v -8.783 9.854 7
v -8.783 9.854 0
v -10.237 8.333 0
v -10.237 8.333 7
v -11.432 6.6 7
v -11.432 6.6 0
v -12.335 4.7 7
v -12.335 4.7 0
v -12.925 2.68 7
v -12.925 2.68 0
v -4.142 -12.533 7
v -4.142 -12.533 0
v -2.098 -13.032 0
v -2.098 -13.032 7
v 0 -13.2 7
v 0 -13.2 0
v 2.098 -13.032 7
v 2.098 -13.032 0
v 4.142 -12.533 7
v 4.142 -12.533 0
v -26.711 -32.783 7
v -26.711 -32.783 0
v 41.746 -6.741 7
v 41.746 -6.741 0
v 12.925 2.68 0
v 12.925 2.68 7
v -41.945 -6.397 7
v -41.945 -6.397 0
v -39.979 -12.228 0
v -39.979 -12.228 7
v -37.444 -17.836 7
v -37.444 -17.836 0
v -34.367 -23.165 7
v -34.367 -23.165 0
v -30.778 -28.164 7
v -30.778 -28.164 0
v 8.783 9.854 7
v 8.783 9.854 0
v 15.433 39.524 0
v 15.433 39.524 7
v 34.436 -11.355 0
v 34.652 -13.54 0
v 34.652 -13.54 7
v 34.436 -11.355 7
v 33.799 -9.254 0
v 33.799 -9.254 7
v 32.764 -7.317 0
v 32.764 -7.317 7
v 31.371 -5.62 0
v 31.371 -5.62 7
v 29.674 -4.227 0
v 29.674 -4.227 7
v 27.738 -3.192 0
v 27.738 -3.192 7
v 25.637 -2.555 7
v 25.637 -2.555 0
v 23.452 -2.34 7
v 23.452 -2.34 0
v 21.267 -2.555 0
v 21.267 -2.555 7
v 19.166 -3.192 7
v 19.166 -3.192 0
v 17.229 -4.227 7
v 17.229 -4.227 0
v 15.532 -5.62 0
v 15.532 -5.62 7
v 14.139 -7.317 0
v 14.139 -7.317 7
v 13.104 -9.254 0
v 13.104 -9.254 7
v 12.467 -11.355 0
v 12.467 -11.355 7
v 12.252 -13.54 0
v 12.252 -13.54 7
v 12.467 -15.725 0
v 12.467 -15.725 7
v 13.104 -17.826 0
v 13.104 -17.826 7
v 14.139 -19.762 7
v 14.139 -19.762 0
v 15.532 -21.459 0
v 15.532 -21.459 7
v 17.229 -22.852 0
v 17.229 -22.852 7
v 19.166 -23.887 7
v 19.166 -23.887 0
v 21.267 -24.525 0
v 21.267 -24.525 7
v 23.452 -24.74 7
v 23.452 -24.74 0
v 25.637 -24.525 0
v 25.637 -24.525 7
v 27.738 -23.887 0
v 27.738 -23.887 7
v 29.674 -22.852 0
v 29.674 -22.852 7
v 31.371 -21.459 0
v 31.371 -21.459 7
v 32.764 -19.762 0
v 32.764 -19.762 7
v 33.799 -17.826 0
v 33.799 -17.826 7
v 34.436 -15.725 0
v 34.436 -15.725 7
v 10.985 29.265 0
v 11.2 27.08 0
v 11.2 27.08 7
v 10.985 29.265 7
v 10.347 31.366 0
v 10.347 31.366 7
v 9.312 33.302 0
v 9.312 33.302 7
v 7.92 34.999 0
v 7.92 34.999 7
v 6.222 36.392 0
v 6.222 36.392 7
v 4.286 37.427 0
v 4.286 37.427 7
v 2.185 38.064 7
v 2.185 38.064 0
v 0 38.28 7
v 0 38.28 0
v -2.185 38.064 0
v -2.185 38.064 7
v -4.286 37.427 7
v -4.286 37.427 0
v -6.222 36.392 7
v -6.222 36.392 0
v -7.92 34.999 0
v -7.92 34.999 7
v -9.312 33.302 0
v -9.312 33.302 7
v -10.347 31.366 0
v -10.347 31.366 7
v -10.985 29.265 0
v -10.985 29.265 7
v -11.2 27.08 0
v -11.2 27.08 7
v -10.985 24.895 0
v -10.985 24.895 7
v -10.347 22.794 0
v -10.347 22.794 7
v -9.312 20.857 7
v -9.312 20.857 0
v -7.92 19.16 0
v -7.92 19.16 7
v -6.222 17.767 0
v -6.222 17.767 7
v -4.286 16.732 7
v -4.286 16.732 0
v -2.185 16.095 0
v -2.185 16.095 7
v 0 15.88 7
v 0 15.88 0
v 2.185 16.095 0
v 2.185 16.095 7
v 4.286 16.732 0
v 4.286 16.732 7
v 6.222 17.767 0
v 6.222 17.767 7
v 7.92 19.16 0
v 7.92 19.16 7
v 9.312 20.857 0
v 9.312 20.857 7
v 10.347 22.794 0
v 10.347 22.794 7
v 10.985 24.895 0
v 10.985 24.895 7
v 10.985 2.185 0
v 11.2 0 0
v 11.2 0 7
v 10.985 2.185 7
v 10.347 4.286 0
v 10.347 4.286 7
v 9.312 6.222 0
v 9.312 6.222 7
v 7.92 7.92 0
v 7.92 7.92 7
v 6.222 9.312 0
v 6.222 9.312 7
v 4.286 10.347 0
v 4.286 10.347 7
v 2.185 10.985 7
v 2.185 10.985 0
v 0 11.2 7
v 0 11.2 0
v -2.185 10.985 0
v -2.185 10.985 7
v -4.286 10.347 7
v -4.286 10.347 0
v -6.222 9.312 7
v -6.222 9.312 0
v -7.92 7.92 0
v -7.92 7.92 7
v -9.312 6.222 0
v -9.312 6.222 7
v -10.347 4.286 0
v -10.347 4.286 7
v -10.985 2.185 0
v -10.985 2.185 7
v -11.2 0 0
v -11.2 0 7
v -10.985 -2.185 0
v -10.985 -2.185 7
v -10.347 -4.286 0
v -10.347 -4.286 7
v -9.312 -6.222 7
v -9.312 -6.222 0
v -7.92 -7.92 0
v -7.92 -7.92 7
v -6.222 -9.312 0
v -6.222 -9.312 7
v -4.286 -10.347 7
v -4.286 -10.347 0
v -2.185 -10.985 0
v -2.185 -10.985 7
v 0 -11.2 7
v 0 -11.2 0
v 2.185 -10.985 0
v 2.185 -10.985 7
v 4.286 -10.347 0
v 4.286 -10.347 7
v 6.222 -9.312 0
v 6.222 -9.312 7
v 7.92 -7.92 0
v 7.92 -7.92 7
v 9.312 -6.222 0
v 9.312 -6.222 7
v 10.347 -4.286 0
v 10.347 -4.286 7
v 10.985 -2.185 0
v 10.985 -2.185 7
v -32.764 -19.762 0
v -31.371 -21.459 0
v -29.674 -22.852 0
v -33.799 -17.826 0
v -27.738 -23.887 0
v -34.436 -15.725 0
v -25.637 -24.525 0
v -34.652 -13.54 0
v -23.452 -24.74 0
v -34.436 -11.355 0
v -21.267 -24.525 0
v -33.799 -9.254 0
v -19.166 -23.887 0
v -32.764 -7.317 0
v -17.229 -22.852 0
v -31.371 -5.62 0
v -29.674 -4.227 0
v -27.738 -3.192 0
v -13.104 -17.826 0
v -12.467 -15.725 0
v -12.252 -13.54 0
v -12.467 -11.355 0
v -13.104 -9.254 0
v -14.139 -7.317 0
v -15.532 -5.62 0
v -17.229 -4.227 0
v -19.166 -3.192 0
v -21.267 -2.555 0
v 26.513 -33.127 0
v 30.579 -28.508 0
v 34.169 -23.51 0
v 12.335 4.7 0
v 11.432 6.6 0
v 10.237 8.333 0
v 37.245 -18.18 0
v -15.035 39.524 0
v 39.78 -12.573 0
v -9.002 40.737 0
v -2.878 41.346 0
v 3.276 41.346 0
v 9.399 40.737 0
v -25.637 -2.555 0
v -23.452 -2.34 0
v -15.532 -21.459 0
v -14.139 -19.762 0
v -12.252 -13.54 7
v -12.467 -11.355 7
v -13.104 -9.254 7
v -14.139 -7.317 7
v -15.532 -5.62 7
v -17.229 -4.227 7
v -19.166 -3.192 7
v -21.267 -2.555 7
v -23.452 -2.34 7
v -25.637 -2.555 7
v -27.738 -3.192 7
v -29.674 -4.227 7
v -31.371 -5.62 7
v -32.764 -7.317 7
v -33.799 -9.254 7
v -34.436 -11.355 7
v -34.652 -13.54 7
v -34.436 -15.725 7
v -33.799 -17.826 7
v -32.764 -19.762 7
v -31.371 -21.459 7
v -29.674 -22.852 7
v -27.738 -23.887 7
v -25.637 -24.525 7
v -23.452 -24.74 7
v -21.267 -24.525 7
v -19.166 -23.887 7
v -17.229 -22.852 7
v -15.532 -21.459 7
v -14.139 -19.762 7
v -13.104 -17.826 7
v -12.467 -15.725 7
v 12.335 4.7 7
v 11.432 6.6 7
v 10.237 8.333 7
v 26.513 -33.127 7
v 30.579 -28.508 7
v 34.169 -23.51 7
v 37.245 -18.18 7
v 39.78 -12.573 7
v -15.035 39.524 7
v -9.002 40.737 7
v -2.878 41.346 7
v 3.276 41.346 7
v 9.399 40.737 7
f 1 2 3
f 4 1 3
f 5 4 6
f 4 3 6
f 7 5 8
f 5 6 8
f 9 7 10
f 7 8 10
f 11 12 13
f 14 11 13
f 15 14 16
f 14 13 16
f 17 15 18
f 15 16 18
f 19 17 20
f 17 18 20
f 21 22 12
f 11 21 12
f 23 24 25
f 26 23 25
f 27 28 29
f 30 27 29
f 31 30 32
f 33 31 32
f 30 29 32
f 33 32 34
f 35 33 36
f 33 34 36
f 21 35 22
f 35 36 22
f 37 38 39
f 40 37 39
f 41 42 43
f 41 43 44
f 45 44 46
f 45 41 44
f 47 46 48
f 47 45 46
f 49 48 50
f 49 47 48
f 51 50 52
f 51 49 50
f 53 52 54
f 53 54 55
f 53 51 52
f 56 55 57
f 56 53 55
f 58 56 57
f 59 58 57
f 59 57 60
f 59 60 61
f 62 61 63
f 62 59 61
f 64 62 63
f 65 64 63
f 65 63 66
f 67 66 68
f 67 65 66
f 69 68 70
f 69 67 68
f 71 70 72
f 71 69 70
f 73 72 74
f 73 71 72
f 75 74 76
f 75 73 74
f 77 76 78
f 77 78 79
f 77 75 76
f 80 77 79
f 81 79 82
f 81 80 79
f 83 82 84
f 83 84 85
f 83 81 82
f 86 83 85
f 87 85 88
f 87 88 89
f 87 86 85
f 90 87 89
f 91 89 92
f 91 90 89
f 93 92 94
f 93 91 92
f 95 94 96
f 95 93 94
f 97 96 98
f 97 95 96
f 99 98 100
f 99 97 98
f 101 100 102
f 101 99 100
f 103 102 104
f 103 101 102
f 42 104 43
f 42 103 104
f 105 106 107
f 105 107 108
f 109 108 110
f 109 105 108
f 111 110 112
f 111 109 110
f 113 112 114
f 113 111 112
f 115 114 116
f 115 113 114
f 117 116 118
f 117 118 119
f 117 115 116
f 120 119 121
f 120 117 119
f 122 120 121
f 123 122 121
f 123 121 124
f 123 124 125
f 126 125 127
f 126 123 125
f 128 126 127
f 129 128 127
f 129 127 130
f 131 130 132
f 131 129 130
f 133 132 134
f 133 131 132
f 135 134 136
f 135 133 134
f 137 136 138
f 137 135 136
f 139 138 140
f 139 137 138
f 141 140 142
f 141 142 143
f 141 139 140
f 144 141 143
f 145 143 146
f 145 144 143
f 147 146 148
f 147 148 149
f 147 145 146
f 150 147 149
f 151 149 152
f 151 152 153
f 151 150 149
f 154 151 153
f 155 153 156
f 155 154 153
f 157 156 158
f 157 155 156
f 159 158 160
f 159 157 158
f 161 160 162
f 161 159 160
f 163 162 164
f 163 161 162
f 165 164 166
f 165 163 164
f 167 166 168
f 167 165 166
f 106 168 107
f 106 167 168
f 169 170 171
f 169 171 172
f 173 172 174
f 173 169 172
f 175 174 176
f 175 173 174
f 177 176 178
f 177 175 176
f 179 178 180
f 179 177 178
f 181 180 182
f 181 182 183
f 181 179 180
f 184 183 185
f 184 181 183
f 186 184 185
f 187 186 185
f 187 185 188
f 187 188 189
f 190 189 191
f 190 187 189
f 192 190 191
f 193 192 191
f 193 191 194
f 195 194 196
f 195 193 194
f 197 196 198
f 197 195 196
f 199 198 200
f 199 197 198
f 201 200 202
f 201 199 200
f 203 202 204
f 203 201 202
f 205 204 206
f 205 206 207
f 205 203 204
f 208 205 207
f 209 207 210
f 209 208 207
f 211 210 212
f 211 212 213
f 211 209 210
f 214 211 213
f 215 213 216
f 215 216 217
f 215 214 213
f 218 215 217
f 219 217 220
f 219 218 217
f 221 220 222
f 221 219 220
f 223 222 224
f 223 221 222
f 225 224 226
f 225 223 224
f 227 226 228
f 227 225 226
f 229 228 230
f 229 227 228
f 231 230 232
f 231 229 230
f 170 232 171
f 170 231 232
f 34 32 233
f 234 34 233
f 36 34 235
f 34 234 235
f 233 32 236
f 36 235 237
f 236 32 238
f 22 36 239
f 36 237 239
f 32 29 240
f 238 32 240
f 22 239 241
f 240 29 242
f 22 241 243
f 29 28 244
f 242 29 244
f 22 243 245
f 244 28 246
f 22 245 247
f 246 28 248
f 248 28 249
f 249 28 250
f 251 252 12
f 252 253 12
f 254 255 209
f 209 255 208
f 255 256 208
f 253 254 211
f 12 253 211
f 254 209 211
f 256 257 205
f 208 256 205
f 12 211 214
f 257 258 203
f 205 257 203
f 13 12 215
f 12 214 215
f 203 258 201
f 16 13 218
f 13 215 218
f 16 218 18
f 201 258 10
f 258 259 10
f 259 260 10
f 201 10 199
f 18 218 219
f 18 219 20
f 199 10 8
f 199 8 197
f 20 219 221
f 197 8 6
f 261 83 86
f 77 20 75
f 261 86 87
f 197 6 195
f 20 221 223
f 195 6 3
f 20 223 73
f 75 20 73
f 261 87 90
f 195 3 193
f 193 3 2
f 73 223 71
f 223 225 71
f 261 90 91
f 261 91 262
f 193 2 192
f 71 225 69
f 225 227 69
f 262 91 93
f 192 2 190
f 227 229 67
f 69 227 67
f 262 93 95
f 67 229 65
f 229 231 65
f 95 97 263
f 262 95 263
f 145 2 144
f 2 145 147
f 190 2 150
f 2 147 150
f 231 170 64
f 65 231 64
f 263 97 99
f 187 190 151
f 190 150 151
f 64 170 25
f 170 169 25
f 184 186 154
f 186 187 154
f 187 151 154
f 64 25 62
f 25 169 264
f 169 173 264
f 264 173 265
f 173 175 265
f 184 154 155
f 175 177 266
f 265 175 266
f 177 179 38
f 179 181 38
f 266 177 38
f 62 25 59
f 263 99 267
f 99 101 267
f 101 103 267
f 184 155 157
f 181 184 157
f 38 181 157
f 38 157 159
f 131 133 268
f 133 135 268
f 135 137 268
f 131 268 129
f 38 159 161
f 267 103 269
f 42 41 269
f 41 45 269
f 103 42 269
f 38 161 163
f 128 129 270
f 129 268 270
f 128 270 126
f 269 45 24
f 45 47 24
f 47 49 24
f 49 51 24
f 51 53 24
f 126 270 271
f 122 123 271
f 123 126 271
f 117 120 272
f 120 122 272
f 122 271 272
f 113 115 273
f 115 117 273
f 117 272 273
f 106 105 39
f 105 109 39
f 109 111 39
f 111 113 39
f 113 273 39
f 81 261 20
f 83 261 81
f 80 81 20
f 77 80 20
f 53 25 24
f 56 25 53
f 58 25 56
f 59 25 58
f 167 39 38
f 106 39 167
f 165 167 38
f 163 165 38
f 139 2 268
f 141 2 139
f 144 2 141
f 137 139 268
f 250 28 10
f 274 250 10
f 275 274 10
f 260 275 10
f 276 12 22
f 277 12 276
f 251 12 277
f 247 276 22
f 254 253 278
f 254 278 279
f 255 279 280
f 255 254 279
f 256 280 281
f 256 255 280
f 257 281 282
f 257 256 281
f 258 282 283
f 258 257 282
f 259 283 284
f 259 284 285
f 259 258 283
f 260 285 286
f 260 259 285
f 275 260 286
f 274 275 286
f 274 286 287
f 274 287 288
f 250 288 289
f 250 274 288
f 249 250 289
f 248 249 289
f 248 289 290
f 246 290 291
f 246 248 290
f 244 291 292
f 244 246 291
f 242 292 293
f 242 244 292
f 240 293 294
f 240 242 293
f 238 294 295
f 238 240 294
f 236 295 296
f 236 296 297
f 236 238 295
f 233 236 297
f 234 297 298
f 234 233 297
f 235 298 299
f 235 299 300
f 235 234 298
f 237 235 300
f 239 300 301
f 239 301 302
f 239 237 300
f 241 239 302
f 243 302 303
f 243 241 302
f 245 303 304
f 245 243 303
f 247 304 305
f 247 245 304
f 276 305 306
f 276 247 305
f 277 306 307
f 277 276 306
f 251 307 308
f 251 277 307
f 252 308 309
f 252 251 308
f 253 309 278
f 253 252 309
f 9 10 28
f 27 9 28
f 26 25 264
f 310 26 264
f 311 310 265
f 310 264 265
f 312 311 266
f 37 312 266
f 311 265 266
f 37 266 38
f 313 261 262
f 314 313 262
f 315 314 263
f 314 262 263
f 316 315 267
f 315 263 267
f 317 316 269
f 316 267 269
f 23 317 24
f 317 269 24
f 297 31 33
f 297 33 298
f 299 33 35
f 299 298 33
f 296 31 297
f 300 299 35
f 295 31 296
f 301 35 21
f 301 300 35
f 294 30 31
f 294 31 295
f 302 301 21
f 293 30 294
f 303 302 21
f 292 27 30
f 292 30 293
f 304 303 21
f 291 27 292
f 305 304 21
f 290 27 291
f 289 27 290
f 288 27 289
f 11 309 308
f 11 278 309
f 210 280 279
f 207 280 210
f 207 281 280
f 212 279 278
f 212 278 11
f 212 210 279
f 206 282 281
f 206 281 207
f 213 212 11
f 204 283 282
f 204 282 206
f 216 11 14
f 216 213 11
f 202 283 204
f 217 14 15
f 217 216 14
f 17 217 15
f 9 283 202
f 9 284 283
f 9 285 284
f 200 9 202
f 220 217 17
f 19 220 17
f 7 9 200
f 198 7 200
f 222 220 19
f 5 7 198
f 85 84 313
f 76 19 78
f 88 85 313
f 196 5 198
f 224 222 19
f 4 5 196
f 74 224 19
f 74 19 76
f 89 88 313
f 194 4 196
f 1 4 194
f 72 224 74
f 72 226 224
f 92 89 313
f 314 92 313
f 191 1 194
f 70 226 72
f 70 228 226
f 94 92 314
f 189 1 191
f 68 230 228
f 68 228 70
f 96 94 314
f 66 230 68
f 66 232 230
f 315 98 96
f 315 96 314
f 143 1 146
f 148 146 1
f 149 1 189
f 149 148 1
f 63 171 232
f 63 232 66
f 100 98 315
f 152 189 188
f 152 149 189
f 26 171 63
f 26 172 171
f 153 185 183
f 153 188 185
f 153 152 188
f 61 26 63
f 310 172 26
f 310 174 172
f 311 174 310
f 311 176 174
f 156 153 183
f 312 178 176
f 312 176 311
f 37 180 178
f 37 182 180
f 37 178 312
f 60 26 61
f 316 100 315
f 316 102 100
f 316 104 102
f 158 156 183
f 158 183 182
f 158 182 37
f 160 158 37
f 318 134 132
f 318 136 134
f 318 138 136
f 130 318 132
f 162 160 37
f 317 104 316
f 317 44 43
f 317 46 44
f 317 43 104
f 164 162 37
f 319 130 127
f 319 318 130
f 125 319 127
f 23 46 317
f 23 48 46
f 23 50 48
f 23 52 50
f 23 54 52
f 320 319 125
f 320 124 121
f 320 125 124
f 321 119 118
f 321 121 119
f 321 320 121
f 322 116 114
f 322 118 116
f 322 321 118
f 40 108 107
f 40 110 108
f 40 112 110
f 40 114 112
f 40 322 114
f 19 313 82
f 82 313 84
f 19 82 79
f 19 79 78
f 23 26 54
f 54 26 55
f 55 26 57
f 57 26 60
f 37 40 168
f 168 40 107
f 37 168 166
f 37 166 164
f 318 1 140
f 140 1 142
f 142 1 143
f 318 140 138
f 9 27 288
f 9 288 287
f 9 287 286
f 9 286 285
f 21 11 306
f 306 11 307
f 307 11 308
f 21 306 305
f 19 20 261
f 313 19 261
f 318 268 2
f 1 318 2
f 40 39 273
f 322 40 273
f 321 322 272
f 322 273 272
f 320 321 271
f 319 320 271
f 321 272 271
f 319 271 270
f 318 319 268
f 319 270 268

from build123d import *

# Parameters (mm, degrees)
F0_R     = 11.2
F1_DEPTH = 7


with BuildPart() as f1:
    # F0 (on Top) → F1 (new body)
    with BuildSketch(Plane.XY):
        with BuildLine():
            ThreePointArc((4.141857, -12.533356), (10.698423, -7.731995), (13.2, 0))
            ThreePointArc((13.2, 0), (13.131104, 1.346893), (12.925133, 2.679725))
            ThreePointArc((12.925133, 2.679725), (11.431535, 6.6), (8.783277, 9.853631))
            ThreePointArc((8.783277, 9.853631), (0, 13.2), (-8.783277, 9.853631))
            ThreePointArc((-8.783277, 9.853631), (-11.431535, 6.6), (-12.925133, 2.679725))
            ThreePointArc((-12.925133, 2.679725), (-11.431535, -6.6), (-4.141857, -12.533356))
            ThreePointArc((-4.141857, -12.533356), (0, -13.2), (4.141857, -12.533356))
        make_face()
        Circle(F0_R, mode=Mode.SUBTRACT)
        with BuildLine():
            ThreePointArc((12.925133, 2.679725), (13.131104, 1.346893), (13.2, 0))
            ThreePointArc((13.2, 0), (10.698423, -7.731995), (4.141857, -12.533356))
            Line((4.141857, -12.533356), (26.512645, -33.127057))
            ThreePointArc((26.512645, -33.127057), (35.773086, -20.883133), (41.746416, -6.741393))
            Line((41.746416, -6.741393), (12.925133, 2.679725))
        make_face()
        with Locations((23.451635, -13.539808)):
            Circle(F0_R, mode=Mode.SUBTRACT)
        with BuildLine():
            ThreePointArc((-8.783277, 9.853631), (0, 13.2), (8.783277, 9.853631))
            Line((8.783277, 9.853631), (15.432551, 39.524153))
            ThreePointArc((15.432551, 39.524153), (0.19878, 41.421968), (-15.03499, 39.524153))
            Line((-15.03499, 39.524153), (-8.783277, 9.853631))
        make_face()
        with Locations((0, 27.079616)):
            Circle(F0_R, mode=Mode.SUBTRACT)
        with BuildLine():
            Line((-26.711425, -32.78276), (-4.141857, -12.533356))
            ThreePointArc((-4.141857, -12.533356), (-11.431535, -6.6), (-12.925133, 2.679725))
            Line((-12.925133, 2.679725), (-41.945196, -6.397096))
            ThreePointArc((-41.945196, -6.397096), (-35.971866, -20.538835), (-26.711425, -32.78276))
        make_face()
        with Locations((-23.451635, -13.539808)):
            Circle(F0_R, mode=Mode.SUBTRACT)
    extrude(amount=F1_DEPTH)


solid = f1.part
